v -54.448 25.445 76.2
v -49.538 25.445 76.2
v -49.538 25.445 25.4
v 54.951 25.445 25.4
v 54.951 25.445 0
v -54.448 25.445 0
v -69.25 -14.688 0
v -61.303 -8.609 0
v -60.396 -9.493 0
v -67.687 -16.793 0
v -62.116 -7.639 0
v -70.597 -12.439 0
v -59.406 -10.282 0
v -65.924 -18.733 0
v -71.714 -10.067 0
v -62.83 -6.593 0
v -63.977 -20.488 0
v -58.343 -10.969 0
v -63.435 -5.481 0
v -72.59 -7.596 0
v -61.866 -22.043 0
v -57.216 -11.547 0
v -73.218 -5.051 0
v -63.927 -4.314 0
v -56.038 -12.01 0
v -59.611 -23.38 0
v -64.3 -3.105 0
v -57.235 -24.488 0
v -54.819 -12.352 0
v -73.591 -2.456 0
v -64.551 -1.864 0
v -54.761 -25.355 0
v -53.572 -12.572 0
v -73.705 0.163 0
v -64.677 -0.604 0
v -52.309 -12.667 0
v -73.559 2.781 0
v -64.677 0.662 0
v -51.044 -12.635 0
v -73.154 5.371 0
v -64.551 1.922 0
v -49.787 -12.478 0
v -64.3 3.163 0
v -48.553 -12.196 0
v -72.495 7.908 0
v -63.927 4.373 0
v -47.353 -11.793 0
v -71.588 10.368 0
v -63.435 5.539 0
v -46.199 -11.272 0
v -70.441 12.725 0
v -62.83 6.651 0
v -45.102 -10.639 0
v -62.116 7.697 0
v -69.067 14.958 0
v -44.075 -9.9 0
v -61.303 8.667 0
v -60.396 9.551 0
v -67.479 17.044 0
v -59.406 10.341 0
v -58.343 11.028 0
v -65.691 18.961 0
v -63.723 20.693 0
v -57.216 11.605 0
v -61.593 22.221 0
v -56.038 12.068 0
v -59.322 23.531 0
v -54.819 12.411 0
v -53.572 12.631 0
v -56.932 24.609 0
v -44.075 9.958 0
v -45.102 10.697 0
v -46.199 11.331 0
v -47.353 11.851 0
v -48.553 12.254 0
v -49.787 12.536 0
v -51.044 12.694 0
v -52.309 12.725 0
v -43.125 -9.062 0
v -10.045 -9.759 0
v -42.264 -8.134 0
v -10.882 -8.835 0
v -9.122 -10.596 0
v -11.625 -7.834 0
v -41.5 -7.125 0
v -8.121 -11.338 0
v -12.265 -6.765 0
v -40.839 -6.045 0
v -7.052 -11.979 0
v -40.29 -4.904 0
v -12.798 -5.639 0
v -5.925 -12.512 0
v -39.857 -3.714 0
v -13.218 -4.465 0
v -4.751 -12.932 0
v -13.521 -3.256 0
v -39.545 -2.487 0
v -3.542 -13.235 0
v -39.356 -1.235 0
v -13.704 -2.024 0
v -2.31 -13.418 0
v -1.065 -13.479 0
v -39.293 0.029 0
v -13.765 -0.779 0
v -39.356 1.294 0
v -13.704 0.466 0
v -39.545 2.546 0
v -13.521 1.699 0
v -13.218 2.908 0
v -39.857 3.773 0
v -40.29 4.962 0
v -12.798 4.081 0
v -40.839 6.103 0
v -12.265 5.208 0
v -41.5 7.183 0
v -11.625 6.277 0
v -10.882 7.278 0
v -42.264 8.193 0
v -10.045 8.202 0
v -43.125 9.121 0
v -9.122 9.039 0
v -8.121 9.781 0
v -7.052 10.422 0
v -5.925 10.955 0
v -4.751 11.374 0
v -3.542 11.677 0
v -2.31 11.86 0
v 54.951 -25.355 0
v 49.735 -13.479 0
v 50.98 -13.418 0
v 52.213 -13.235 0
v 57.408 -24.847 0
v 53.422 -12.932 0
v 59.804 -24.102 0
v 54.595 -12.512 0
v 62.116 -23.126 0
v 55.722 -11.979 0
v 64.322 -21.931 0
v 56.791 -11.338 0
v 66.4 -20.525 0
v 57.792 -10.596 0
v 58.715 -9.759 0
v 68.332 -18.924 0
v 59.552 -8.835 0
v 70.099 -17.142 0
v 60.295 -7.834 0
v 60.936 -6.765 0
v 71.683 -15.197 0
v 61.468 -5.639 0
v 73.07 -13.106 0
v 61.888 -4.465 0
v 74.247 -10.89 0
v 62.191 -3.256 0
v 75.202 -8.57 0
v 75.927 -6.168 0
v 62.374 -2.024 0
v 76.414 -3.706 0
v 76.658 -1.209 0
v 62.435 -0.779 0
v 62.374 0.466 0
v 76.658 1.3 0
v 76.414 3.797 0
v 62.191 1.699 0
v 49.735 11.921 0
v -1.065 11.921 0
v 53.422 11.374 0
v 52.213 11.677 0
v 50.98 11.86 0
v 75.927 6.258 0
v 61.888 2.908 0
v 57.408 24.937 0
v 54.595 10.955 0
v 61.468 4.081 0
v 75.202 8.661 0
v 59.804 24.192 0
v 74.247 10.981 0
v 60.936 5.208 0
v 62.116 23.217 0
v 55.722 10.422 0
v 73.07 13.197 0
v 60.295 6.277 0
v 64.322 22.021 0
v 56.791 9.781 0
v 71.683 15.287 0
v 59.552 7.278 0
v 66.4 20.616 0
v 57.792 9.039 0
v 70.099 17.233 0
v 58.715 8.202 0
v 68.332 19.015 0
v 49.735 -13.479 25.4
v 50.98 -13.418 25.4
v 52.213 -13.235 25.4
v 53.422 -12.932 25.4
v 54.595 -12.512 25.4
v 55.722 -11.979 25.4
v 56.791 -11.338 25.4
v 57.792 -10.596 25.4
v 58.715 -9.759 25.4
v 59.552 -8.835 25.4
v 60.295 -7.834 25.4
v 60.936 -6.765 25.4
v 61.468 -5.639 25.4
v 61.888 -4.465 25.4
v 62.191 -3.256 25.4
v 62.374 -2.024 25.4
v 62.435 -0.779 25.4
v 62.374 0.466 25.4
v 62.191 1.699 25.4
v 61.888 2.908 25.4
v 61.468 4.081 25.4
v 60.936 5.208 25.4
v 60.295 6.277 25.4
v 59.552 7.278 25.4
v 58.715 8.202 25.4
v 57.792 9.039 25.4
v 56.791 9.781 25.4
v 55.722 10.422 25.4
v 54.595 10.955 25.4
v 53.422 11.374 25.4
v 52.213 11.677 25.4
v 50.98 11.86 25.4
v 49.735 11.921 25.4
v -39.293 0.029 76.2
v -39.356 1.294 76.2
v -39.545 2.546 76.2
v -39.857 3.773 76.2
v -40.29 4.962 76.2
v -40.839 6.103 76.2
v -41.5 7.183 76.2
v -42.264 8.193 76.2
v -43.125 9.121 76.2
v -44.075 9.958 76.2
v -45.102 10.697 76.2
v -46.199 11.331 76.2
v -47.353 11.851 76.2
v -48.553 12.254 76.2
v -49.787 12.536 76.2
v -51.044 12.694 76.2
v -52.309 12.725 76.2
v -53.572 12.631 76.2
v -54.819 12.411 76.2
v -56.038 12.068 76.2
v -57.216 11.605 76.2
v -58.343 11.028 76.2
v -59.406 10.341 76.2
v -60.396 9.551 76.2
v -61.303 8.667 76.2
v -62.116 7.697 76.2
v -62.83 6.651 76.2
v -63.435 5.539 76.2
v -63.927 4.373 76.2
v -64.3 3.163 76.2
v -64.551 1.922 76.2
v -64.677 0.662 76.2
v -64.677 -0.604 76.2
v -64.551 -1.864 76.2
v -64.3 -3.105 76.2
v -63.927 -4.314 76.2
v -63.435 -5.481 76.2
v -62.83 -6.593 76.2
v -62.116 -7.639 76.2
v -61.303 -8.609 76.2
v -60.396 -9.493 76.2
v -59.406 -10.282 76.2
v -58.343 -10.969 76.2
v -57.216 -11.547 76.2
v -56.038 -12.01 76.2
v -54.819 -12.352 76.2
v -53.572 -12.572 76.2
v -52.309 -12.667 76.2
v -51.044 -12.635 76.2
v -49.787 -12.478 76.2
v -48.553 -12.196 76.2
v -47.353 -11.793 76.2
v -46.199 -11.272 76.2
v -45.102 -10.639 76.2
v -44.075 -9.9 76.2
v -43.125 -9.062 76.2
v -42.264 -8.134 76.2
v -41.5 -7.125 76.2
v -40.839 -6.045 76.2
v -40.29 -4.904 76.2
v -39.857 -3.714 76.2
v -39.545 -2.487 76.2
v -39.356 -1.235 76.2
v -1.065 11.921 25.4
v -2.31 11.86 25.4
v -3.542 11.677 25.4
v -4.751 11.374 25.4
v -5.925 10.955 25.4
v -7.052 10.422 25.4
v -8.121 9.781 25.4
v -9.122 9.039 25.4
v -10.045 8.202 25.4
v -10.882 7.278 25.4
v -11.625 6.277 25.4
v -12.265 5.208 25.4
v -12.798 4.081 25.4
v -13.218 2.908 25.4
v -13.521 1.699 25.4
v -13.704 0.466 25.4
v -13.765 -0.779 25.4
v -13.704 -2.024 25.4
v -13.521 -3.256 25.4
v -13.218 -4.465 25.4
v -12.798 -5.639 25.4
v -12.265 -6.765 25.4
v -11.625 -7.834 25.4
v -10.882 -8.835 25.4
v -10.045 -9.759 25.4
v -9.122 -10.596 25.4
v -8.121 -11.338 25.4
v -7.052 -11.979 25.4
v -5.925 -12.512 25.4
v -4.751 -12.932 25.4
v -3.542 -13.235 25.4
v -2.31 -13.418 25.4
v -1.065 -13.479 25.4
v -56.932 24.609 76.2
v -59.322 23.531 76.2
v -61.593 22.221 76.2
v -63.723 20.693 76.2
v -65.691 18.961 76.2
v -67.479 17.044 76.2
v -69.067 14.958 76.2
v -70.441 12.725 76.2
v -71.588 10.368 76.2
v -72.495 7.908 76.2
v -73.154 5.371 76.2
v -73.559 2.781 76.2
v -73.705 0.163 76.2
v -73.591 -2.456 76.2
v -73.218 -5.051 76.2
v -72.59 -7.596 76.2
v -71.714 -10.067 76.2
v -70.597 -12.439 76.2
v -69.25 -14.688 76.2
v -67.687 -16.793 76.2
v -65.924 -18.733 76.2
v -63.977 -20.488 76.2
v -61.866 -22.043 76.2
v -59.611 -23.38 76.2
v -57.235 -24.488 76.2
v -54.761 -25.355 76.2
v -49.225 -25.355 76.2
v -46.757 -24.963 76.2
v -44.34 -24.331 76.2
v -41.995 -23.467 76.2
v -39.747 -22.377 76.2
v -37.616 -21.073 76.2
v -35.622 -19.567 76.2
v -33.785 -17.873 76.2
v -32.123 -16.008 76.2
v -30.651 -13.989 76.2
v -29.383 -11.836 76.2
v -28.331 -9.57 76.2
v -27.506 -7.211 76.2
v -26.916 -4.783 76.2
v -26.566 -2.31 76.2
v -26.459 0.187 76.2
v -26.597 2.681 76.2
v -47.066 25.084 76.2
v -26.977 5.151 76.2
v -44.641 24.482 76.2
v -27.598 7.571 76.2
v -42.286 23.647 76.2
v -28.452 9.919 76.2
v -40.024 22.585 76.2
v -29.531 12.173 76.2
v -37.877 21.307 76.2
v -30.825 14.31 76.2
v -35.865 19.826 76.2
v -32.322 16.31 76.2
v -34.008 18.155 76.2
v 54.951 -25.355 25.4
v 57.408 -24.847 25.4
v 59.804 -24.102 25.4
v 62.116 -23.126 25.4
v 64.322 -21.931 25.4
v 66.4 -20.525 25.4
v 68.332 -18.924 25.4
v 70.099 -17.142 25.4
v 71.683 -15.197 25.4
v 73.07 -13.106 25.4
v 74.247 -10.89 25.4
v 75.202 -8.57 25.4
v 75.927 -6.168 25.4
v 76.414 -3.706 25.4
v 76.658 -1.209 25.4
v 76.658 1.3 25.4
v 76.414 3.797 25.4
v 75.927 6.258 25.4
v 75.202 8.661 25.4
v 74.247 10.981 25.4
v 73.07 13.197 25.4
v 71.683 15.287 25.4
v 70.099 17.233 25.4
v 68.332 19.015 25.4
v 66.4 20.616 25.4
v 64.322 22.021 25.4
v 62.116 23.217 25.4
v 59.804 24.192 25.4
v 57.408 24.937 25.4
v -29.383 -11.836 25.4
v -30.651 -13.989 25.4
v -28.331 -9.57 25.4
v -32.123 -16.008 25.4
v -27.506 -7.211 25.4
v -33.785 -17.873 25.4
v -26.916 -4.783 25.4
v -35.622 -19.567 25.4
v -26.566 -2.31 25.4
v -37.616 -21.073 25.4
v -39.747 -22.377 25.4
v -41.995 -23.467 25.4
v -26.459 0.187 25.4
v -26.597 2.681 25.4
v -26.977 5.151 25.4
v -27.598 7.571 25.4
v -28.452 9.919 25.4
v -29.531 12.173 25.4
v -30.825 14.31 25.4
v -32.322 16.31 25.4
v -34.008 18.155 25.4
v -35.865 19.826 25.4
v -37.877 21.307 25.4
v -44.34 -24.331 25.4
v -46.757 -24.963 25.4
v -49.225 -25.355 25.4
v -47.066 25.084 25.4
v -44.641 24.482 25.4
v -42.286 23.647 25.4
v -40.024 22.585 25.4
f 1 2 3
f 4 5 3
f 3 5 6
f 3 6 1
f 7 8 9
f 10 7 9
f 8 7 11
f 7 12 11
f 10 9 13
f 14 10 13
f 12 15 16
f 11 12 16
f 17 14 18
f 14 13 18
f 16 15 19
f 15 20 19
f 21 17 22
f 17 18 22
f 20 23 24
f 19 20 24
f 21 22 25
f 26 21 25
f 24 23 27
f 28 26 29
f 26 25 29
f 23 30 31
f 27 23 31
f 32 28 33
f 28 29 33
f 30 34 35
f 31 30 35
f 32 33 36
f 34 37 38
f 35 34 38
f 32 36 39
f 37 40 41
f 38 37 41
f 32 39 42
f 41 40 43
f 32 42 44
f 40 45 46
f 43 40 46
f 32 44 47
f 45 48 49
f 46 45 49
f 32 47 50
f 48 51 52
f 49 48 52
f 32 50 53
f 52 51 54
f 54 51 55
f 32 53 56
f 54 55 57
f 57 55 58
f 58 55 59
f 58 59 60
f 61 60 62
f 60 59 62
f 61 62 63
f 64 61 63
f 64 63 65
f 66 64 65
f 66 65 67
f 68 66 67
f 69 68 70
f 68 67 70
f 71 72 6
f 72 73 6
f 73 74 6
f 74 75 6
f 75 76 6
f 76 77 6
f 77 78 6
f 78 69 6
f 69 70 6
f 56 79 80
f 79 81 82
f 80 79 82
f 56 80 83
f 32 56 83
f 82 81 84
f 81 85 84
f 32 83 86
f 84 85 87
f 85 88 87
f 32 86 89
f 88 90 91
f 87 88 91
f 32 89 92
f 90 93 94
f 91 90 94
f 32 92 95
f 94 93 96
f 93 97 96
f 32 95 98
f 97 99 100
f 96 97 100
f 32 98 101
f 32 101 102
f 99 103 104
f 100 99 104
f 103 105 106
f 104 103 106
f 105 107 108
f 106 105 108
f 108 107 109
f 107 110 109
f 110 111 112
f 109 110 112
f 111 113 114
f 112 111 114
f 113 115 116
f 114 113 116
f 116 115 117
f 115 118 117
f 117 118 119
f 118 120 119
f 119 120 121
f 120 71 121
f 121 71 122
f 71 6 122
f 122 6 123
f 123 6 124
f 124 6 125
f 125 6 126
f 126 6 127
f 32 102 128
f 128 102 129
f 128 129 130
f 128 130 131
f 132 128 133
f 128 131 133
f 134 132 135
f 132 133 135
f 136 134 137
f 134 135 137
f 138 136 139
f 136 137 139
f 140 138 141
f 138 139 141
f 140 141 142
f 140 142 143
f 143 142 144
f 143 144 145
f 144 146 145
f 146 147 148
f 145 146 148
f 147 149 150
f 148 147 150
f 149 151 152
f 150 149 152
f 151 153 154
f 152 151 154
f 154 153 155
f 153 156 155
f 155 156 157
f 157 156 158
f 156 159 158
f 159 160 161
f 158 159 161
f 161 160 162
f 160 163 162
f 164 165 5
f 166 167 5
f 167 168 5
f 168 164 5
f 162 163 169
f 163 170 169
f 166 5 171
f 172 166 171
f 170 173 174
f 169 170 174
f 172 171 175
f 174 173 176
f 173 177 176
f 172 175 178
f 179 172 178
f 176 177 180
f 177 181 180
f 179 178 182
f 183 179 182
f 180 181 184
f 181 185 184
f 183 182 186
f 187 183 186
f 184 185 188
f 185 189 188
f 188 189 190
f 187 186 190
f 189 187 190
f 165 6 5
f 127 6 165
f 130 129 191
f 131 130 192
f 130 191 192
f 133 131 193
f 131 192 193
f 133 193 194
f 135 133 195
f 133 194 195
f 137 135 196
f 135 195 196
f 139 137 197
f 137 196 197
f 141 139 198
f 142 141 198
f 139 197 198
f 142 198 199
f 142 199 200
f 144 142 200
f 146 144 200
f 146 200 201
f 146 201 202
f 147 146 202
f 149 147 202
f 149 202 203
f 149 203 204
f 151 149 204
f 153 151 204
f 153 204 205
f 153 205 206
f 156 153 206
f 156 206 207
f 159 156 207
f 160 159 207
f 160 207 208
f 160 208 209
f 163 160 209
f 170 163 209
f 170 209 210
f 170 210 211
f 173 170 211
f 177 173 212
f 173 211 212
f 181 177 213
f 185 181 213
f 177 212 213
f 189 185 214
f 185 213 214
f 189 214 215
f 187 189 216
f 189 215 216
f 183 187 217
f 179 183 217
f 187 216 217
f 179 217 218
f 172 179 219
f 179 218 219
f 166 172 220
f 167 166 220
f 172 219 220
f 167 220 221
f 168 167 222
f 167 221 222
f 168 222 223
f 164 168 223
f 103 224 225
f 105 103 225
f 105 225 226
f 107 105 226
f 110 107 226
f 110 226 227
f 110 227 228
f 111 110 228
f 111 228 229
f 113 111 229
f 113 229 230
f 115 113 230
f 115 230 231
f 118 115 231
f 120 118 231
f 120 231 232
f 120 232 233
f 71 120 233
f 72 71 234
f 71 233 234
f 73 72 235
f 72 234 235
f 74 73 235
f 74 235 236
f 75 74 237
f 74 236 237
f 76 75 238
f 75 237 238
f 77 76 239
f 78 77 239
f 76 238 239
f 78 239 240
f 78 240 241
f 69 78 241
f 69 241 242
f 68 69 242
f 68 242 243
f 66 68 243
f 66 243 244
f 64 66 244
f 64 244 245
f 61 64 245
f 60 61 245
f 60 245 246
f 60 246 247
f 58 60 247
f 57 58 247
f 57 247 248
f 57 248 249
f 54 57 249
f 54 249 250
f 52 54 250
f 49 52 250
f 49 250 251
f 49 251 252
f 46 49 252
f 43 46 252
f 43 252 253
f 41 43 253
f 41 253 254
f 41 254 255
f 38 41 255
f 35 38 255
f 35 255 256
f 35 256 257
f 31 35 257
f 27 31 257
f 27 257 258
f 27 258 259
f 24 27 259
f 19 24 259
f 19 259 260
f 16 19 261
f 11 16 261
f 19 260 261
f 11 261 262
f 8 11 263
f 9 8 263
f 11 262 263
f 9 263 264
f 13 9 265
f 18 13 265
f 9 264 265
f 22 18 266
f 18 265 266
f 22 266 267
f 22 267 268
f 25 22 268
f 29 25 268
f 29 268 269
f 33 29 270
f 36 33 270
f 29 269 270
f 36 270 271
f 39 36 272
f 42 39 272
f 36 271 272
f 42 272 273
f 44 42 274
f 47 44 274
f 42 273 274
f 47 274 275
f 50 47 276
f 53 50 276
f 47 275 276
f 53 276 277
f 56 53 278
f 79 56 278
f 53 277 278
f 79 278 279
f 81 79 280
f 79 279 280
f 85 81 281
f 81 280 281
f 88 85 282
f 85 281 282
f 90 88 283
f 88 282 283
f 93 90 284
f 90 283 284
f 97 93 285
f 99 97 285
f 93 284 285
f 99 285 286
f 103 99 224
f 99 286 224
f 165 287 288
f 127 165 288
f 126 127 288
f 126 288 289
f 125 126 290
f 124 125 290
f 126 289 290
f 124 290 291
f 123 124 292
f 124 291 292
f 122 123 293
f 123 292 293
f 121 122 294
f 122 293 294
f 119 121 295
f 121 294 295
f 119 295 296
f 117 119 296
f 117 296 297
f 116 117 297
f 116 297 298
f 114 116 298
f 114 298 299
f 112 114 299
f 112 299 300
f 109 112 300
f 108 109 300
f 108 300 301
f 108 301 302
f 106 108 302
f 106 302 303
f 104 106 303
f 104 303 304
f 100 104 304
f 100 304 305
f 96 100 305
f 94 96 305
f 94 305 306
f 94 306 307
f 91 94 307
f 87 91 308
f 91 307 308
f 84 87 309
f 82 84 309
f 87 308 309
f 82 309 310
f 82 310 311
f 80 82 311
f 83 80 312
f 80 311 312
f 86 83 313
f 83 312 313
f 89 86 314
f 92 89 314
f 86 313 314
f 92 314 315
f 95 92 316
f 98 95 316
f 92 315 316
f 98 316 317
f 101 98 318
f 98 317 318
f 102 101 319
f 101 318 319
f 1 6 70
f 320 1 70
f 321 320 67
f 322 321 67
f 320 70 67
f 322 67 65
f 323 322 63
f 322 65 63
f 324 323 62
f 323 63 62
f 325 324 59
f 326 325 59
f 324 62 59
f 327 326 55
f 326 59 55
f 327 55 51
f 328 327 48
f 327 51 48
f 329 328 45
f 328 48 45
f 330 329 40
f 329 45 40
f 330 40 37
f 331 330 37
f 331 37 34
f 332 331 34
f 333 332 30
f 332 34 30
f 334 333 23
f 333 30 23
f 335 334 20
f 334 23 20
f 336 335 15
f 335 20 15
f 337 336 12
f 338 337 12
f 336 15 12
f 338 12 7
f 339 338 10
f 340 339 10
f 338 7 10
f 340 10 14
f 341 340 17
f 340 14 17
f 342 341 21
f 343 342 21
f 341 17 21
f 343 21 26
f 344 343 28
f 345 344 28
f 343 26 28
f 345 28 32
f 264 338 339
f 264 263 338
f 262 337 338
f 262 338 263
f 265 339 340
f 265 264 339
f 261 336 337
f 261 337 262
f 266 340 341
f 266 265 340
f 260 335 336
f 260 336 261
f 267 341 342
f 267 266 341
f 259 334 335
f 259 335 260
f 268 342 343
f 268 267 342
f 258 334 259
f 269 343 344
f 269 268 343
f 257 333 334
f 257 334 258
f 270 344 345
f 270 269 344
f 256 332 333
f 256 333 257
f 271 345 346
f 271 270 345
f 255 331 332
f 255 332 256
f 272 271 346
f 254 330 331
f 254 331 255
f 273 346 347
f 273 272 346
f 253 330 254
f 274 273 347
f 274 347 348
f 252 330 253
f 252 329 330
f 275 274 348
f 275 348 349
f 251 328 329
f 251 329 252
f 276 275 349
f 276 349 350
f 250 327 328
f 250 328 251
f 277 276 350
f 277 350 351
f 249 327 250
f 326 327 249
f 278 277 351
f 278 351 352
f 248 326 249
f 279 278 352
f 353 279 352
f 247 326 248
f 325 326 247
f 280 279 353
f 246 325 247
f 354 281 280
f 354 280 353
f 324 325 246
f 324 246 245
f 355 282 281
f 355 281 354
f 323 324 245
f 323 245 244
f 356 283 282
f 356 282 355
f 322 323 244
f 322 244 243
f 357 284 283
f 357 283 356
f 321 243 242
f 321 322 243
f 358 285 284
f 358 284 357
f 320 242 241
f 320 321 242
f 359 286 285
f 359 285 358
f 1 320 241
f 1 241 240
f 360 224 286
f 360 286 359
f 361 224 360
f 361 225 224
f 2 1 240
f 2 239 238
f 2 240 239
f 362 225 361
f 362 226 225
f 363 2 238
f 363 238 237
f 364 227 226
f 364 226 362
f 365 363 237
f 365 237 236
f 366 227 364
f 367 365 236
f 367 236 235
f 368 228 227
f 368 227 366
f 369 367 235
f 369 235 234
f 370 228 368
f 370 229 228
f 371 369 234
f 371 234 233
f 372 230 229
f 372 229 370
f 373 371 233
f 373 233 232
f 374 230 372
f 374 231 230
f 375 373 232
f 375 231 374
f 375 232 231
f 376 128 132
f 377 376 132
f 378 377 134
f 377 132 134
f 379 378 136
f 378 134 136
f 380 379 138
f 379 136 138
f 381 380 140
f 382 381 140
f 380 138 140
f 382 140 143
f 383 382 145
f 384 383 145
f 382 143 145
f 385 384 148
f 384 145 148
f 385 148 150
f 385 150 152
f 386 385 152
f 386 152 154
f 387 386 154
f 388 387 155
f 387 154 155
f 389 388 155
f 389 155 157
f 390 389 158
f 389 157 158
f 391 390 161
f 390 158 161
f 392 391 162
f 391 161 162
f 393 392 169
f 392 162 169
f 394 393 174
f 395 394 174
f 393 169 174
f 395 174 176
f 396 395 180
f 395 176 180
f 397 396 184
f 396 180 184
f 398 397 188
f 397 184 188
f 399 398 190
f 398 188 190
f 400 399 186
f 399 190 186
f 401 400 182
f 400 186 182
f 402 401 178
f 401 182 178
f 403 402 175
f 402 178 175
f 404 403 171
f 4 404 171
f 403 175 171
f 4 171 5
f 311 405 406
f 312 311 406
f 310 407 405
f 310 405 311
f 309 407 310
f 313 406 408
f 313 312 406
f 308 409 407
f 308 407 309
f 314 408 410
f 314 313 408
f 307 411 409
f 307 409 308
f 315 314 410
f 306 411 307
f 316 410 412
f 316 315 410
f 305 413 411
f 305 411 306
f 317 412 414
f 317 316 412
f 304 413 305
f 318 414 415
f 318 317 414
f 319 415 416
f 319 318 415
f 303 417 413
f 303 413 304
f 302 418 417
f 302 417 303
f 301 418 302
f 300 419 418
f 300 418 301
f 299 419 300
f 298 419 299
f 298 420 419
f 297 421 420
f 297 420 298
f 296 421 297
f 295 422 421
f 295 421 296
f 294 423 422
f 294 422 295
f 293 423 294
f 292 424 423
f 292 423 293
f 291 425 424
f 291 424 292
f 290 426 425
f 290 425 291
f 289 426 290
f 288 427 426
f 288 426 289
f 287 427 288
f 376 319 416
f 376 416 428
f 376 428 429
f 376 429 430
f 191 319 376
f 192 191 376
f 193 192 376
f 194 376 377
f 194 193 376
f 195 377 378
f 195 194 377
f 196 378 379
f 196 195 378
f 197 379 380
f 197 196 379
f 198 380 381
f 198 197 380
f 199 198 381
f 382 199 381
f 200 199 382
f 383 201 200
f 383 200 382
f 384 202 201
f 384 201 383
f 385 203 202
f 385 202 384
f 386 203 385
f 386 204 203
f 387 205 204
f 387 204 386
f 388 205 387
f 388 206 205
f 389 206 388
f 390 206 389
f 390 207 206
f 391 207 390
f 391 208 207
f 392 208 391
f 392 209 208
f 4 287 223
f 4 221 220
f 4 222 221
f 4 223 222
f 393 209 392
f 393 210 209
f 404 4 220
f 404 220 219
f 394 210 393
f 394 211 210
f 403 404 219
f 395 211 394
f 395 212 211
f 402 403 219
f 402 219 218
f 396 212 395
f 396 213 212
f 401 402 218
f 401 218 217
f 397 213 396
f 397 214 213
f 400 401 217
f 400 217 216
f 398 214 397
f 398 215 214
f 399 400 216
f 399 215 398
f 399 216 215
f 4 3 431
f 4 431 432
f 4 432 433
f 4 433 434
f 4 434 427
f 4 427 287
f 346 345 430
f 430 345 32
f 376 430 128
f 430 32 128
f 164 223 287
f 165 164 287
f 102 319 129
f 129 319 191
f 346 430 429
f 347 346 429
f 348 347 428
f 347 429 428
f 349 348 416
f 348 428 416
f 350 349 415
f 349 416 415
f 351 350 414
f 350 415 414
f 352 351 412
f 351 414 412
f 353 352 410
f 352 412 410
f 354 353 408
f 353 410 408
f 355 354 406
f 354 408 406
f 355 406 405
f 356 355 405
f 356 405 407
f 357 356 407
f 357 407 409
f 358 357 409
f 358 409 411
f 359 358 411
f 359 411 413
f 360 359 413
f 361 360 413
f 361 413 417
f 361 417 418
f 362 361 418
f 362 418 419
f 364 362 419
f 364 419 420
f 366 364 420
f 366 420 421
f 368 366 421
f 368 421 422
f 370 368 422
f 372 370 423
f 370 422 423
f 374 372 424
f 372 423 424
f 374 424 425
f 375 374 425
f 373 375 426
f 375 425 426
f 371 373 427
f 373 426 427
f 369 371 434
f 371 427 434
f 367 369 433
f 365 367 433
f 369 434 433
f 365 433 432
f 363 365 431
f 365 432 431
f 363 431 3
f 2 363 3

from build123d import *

# Parameters (mm, degrees)
F1_DEPTH = 25.4
F2_DEPTH = 76.2
F3_R     = 12.7
F4_DEPTH = 76.201
F6_DEPTH = 25.401


with BuildPart() as f1:
    # F0 (on Top) → F1 (new body)
    with BuildSketch(Plane.XY):
        with BuildLine():
            Line((54.951176, 25.445276), (-49.537972, 25.445276))
            ThreePointArc((-49.537972, 25.445276), (-26.458922, 0.186695), (-49.224562, -25.354724))
            Line((-49.224562, -25.354724), (54.951176, -25.354724))
            ThreePointArc((54.951176, -25.354724), (76.688998, 0.045276), (54.951176, 25.445276))
        make_face()
    extrude(amount=F1_DEPTH)

    # F0 (on Top) → F2 (join)
    with BuildSketch(Plane.XY):
        with BuildLine():
            Line((-49.537972, 25.445276), (-54.447679, 25.445276))
            ThreePointArc((-54.447679, 25.445276), (-73.704644, 0.163115), (-54.761089, -25.354724))
            Line((-54.761089, -25.354724), (-49.224562, -25.354724))
            ThreePointArc((-49.224562, -25.354724), (-26.458922, 0.186695), (-49.537972, 25.445276))
        make_face()
    extrude(amount=F2_DEPTH)

    # F3 (on face) → F4 (cut, through all)
    with BuildSketch(Plane.XY.offset(76.2)):
        with Locations((-51.992825, 0.029164)):
            Circle(F3_R)
    extrude(amount=-F4_DEPTH, mode=Mode.SUBTRACT)

    # F5 (on face) → F6 (cut, through all)
    with BuildSketch(Plane.XY.offset(25.4)):
        with BuildLine():
            Line((49.735157, 11.921302), (-1.064843, 11.921302))
            ThreePointArc((-1.064843, 11.921302), (-13.764843, -0.778698), (-1.064843, -13.478698))
            Line((-1.064843, -13.478698), (49.735157, -13.478698))
            ThreePointArc((49.735157, -13.478698), (62.435157, -0.778698), (49.735157, 11.921302))
        make_face()
    extrude(amount=-F6_DEPTH, mode=Mode.SUBTRACT)


solid = f1.part
